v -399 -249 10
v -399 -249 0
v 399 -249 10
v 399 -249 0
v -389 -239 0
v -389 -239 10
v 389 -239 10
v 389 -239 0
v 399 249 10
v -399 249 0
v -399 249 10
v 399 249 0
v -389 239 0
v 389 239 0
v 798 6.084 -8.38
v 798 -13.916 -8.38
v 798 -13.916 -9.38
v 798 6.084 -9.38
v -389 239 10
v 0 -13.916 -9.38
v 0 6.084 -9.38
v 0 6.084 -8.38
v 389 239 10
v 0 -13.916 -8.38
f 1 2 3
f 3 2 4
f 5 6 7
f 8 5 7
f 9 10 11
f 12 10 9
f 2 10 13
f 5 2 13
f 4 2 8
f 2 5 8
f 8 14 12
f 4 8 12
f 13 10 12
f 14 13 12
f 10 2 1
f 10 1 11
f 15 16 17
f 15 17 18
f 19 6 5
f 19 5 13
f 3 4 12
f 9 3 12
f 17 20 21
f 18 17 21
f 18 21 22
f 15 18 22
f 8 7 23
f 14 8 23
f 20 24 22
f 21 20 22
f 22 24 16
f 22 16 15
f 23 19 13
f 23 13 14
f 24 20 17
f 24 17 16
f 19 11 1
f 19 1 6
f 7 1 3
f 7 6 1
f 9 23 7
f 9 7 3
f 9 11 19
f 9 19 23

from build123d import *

# Parameters (mm, degrees)
F0_W     = 798
F0_H     = 498
F1_DEPTH = 10
F2_W     = 778
F2_H     = 478
F3_DEPTH = 10.001
F4_W     = 20
F4_H     = 1
F5_DEPTH = 798


with BuildPart() as f1:
    # F0 (on Top) → F1 (new body)
    with BuildSketch(Plane.XY):
        Rectangle(F0_W, F0_H)
    extrude(amount=F1_DEPTH)

    # F2 (on face) → F3 (cut, through all)
    with BuildSketch(Plane.XY.offset(10)):
        Rectangle(F2_W, F2_H)
    extrude(amount=-F3_DEPTH, mode=Mode.SUBTRACT)


with BuildPart() as f5:
    # F4 (on Right) → F5 (new body)
    with BuildSketch(Plane.YZ):
        with Locations((-3.915781, -8.880123)):
            Rectangle(F4_W, F4_H)
    extrude(amount=F5_DEPTH)


solid = Compound([f1.part, f5.part])
